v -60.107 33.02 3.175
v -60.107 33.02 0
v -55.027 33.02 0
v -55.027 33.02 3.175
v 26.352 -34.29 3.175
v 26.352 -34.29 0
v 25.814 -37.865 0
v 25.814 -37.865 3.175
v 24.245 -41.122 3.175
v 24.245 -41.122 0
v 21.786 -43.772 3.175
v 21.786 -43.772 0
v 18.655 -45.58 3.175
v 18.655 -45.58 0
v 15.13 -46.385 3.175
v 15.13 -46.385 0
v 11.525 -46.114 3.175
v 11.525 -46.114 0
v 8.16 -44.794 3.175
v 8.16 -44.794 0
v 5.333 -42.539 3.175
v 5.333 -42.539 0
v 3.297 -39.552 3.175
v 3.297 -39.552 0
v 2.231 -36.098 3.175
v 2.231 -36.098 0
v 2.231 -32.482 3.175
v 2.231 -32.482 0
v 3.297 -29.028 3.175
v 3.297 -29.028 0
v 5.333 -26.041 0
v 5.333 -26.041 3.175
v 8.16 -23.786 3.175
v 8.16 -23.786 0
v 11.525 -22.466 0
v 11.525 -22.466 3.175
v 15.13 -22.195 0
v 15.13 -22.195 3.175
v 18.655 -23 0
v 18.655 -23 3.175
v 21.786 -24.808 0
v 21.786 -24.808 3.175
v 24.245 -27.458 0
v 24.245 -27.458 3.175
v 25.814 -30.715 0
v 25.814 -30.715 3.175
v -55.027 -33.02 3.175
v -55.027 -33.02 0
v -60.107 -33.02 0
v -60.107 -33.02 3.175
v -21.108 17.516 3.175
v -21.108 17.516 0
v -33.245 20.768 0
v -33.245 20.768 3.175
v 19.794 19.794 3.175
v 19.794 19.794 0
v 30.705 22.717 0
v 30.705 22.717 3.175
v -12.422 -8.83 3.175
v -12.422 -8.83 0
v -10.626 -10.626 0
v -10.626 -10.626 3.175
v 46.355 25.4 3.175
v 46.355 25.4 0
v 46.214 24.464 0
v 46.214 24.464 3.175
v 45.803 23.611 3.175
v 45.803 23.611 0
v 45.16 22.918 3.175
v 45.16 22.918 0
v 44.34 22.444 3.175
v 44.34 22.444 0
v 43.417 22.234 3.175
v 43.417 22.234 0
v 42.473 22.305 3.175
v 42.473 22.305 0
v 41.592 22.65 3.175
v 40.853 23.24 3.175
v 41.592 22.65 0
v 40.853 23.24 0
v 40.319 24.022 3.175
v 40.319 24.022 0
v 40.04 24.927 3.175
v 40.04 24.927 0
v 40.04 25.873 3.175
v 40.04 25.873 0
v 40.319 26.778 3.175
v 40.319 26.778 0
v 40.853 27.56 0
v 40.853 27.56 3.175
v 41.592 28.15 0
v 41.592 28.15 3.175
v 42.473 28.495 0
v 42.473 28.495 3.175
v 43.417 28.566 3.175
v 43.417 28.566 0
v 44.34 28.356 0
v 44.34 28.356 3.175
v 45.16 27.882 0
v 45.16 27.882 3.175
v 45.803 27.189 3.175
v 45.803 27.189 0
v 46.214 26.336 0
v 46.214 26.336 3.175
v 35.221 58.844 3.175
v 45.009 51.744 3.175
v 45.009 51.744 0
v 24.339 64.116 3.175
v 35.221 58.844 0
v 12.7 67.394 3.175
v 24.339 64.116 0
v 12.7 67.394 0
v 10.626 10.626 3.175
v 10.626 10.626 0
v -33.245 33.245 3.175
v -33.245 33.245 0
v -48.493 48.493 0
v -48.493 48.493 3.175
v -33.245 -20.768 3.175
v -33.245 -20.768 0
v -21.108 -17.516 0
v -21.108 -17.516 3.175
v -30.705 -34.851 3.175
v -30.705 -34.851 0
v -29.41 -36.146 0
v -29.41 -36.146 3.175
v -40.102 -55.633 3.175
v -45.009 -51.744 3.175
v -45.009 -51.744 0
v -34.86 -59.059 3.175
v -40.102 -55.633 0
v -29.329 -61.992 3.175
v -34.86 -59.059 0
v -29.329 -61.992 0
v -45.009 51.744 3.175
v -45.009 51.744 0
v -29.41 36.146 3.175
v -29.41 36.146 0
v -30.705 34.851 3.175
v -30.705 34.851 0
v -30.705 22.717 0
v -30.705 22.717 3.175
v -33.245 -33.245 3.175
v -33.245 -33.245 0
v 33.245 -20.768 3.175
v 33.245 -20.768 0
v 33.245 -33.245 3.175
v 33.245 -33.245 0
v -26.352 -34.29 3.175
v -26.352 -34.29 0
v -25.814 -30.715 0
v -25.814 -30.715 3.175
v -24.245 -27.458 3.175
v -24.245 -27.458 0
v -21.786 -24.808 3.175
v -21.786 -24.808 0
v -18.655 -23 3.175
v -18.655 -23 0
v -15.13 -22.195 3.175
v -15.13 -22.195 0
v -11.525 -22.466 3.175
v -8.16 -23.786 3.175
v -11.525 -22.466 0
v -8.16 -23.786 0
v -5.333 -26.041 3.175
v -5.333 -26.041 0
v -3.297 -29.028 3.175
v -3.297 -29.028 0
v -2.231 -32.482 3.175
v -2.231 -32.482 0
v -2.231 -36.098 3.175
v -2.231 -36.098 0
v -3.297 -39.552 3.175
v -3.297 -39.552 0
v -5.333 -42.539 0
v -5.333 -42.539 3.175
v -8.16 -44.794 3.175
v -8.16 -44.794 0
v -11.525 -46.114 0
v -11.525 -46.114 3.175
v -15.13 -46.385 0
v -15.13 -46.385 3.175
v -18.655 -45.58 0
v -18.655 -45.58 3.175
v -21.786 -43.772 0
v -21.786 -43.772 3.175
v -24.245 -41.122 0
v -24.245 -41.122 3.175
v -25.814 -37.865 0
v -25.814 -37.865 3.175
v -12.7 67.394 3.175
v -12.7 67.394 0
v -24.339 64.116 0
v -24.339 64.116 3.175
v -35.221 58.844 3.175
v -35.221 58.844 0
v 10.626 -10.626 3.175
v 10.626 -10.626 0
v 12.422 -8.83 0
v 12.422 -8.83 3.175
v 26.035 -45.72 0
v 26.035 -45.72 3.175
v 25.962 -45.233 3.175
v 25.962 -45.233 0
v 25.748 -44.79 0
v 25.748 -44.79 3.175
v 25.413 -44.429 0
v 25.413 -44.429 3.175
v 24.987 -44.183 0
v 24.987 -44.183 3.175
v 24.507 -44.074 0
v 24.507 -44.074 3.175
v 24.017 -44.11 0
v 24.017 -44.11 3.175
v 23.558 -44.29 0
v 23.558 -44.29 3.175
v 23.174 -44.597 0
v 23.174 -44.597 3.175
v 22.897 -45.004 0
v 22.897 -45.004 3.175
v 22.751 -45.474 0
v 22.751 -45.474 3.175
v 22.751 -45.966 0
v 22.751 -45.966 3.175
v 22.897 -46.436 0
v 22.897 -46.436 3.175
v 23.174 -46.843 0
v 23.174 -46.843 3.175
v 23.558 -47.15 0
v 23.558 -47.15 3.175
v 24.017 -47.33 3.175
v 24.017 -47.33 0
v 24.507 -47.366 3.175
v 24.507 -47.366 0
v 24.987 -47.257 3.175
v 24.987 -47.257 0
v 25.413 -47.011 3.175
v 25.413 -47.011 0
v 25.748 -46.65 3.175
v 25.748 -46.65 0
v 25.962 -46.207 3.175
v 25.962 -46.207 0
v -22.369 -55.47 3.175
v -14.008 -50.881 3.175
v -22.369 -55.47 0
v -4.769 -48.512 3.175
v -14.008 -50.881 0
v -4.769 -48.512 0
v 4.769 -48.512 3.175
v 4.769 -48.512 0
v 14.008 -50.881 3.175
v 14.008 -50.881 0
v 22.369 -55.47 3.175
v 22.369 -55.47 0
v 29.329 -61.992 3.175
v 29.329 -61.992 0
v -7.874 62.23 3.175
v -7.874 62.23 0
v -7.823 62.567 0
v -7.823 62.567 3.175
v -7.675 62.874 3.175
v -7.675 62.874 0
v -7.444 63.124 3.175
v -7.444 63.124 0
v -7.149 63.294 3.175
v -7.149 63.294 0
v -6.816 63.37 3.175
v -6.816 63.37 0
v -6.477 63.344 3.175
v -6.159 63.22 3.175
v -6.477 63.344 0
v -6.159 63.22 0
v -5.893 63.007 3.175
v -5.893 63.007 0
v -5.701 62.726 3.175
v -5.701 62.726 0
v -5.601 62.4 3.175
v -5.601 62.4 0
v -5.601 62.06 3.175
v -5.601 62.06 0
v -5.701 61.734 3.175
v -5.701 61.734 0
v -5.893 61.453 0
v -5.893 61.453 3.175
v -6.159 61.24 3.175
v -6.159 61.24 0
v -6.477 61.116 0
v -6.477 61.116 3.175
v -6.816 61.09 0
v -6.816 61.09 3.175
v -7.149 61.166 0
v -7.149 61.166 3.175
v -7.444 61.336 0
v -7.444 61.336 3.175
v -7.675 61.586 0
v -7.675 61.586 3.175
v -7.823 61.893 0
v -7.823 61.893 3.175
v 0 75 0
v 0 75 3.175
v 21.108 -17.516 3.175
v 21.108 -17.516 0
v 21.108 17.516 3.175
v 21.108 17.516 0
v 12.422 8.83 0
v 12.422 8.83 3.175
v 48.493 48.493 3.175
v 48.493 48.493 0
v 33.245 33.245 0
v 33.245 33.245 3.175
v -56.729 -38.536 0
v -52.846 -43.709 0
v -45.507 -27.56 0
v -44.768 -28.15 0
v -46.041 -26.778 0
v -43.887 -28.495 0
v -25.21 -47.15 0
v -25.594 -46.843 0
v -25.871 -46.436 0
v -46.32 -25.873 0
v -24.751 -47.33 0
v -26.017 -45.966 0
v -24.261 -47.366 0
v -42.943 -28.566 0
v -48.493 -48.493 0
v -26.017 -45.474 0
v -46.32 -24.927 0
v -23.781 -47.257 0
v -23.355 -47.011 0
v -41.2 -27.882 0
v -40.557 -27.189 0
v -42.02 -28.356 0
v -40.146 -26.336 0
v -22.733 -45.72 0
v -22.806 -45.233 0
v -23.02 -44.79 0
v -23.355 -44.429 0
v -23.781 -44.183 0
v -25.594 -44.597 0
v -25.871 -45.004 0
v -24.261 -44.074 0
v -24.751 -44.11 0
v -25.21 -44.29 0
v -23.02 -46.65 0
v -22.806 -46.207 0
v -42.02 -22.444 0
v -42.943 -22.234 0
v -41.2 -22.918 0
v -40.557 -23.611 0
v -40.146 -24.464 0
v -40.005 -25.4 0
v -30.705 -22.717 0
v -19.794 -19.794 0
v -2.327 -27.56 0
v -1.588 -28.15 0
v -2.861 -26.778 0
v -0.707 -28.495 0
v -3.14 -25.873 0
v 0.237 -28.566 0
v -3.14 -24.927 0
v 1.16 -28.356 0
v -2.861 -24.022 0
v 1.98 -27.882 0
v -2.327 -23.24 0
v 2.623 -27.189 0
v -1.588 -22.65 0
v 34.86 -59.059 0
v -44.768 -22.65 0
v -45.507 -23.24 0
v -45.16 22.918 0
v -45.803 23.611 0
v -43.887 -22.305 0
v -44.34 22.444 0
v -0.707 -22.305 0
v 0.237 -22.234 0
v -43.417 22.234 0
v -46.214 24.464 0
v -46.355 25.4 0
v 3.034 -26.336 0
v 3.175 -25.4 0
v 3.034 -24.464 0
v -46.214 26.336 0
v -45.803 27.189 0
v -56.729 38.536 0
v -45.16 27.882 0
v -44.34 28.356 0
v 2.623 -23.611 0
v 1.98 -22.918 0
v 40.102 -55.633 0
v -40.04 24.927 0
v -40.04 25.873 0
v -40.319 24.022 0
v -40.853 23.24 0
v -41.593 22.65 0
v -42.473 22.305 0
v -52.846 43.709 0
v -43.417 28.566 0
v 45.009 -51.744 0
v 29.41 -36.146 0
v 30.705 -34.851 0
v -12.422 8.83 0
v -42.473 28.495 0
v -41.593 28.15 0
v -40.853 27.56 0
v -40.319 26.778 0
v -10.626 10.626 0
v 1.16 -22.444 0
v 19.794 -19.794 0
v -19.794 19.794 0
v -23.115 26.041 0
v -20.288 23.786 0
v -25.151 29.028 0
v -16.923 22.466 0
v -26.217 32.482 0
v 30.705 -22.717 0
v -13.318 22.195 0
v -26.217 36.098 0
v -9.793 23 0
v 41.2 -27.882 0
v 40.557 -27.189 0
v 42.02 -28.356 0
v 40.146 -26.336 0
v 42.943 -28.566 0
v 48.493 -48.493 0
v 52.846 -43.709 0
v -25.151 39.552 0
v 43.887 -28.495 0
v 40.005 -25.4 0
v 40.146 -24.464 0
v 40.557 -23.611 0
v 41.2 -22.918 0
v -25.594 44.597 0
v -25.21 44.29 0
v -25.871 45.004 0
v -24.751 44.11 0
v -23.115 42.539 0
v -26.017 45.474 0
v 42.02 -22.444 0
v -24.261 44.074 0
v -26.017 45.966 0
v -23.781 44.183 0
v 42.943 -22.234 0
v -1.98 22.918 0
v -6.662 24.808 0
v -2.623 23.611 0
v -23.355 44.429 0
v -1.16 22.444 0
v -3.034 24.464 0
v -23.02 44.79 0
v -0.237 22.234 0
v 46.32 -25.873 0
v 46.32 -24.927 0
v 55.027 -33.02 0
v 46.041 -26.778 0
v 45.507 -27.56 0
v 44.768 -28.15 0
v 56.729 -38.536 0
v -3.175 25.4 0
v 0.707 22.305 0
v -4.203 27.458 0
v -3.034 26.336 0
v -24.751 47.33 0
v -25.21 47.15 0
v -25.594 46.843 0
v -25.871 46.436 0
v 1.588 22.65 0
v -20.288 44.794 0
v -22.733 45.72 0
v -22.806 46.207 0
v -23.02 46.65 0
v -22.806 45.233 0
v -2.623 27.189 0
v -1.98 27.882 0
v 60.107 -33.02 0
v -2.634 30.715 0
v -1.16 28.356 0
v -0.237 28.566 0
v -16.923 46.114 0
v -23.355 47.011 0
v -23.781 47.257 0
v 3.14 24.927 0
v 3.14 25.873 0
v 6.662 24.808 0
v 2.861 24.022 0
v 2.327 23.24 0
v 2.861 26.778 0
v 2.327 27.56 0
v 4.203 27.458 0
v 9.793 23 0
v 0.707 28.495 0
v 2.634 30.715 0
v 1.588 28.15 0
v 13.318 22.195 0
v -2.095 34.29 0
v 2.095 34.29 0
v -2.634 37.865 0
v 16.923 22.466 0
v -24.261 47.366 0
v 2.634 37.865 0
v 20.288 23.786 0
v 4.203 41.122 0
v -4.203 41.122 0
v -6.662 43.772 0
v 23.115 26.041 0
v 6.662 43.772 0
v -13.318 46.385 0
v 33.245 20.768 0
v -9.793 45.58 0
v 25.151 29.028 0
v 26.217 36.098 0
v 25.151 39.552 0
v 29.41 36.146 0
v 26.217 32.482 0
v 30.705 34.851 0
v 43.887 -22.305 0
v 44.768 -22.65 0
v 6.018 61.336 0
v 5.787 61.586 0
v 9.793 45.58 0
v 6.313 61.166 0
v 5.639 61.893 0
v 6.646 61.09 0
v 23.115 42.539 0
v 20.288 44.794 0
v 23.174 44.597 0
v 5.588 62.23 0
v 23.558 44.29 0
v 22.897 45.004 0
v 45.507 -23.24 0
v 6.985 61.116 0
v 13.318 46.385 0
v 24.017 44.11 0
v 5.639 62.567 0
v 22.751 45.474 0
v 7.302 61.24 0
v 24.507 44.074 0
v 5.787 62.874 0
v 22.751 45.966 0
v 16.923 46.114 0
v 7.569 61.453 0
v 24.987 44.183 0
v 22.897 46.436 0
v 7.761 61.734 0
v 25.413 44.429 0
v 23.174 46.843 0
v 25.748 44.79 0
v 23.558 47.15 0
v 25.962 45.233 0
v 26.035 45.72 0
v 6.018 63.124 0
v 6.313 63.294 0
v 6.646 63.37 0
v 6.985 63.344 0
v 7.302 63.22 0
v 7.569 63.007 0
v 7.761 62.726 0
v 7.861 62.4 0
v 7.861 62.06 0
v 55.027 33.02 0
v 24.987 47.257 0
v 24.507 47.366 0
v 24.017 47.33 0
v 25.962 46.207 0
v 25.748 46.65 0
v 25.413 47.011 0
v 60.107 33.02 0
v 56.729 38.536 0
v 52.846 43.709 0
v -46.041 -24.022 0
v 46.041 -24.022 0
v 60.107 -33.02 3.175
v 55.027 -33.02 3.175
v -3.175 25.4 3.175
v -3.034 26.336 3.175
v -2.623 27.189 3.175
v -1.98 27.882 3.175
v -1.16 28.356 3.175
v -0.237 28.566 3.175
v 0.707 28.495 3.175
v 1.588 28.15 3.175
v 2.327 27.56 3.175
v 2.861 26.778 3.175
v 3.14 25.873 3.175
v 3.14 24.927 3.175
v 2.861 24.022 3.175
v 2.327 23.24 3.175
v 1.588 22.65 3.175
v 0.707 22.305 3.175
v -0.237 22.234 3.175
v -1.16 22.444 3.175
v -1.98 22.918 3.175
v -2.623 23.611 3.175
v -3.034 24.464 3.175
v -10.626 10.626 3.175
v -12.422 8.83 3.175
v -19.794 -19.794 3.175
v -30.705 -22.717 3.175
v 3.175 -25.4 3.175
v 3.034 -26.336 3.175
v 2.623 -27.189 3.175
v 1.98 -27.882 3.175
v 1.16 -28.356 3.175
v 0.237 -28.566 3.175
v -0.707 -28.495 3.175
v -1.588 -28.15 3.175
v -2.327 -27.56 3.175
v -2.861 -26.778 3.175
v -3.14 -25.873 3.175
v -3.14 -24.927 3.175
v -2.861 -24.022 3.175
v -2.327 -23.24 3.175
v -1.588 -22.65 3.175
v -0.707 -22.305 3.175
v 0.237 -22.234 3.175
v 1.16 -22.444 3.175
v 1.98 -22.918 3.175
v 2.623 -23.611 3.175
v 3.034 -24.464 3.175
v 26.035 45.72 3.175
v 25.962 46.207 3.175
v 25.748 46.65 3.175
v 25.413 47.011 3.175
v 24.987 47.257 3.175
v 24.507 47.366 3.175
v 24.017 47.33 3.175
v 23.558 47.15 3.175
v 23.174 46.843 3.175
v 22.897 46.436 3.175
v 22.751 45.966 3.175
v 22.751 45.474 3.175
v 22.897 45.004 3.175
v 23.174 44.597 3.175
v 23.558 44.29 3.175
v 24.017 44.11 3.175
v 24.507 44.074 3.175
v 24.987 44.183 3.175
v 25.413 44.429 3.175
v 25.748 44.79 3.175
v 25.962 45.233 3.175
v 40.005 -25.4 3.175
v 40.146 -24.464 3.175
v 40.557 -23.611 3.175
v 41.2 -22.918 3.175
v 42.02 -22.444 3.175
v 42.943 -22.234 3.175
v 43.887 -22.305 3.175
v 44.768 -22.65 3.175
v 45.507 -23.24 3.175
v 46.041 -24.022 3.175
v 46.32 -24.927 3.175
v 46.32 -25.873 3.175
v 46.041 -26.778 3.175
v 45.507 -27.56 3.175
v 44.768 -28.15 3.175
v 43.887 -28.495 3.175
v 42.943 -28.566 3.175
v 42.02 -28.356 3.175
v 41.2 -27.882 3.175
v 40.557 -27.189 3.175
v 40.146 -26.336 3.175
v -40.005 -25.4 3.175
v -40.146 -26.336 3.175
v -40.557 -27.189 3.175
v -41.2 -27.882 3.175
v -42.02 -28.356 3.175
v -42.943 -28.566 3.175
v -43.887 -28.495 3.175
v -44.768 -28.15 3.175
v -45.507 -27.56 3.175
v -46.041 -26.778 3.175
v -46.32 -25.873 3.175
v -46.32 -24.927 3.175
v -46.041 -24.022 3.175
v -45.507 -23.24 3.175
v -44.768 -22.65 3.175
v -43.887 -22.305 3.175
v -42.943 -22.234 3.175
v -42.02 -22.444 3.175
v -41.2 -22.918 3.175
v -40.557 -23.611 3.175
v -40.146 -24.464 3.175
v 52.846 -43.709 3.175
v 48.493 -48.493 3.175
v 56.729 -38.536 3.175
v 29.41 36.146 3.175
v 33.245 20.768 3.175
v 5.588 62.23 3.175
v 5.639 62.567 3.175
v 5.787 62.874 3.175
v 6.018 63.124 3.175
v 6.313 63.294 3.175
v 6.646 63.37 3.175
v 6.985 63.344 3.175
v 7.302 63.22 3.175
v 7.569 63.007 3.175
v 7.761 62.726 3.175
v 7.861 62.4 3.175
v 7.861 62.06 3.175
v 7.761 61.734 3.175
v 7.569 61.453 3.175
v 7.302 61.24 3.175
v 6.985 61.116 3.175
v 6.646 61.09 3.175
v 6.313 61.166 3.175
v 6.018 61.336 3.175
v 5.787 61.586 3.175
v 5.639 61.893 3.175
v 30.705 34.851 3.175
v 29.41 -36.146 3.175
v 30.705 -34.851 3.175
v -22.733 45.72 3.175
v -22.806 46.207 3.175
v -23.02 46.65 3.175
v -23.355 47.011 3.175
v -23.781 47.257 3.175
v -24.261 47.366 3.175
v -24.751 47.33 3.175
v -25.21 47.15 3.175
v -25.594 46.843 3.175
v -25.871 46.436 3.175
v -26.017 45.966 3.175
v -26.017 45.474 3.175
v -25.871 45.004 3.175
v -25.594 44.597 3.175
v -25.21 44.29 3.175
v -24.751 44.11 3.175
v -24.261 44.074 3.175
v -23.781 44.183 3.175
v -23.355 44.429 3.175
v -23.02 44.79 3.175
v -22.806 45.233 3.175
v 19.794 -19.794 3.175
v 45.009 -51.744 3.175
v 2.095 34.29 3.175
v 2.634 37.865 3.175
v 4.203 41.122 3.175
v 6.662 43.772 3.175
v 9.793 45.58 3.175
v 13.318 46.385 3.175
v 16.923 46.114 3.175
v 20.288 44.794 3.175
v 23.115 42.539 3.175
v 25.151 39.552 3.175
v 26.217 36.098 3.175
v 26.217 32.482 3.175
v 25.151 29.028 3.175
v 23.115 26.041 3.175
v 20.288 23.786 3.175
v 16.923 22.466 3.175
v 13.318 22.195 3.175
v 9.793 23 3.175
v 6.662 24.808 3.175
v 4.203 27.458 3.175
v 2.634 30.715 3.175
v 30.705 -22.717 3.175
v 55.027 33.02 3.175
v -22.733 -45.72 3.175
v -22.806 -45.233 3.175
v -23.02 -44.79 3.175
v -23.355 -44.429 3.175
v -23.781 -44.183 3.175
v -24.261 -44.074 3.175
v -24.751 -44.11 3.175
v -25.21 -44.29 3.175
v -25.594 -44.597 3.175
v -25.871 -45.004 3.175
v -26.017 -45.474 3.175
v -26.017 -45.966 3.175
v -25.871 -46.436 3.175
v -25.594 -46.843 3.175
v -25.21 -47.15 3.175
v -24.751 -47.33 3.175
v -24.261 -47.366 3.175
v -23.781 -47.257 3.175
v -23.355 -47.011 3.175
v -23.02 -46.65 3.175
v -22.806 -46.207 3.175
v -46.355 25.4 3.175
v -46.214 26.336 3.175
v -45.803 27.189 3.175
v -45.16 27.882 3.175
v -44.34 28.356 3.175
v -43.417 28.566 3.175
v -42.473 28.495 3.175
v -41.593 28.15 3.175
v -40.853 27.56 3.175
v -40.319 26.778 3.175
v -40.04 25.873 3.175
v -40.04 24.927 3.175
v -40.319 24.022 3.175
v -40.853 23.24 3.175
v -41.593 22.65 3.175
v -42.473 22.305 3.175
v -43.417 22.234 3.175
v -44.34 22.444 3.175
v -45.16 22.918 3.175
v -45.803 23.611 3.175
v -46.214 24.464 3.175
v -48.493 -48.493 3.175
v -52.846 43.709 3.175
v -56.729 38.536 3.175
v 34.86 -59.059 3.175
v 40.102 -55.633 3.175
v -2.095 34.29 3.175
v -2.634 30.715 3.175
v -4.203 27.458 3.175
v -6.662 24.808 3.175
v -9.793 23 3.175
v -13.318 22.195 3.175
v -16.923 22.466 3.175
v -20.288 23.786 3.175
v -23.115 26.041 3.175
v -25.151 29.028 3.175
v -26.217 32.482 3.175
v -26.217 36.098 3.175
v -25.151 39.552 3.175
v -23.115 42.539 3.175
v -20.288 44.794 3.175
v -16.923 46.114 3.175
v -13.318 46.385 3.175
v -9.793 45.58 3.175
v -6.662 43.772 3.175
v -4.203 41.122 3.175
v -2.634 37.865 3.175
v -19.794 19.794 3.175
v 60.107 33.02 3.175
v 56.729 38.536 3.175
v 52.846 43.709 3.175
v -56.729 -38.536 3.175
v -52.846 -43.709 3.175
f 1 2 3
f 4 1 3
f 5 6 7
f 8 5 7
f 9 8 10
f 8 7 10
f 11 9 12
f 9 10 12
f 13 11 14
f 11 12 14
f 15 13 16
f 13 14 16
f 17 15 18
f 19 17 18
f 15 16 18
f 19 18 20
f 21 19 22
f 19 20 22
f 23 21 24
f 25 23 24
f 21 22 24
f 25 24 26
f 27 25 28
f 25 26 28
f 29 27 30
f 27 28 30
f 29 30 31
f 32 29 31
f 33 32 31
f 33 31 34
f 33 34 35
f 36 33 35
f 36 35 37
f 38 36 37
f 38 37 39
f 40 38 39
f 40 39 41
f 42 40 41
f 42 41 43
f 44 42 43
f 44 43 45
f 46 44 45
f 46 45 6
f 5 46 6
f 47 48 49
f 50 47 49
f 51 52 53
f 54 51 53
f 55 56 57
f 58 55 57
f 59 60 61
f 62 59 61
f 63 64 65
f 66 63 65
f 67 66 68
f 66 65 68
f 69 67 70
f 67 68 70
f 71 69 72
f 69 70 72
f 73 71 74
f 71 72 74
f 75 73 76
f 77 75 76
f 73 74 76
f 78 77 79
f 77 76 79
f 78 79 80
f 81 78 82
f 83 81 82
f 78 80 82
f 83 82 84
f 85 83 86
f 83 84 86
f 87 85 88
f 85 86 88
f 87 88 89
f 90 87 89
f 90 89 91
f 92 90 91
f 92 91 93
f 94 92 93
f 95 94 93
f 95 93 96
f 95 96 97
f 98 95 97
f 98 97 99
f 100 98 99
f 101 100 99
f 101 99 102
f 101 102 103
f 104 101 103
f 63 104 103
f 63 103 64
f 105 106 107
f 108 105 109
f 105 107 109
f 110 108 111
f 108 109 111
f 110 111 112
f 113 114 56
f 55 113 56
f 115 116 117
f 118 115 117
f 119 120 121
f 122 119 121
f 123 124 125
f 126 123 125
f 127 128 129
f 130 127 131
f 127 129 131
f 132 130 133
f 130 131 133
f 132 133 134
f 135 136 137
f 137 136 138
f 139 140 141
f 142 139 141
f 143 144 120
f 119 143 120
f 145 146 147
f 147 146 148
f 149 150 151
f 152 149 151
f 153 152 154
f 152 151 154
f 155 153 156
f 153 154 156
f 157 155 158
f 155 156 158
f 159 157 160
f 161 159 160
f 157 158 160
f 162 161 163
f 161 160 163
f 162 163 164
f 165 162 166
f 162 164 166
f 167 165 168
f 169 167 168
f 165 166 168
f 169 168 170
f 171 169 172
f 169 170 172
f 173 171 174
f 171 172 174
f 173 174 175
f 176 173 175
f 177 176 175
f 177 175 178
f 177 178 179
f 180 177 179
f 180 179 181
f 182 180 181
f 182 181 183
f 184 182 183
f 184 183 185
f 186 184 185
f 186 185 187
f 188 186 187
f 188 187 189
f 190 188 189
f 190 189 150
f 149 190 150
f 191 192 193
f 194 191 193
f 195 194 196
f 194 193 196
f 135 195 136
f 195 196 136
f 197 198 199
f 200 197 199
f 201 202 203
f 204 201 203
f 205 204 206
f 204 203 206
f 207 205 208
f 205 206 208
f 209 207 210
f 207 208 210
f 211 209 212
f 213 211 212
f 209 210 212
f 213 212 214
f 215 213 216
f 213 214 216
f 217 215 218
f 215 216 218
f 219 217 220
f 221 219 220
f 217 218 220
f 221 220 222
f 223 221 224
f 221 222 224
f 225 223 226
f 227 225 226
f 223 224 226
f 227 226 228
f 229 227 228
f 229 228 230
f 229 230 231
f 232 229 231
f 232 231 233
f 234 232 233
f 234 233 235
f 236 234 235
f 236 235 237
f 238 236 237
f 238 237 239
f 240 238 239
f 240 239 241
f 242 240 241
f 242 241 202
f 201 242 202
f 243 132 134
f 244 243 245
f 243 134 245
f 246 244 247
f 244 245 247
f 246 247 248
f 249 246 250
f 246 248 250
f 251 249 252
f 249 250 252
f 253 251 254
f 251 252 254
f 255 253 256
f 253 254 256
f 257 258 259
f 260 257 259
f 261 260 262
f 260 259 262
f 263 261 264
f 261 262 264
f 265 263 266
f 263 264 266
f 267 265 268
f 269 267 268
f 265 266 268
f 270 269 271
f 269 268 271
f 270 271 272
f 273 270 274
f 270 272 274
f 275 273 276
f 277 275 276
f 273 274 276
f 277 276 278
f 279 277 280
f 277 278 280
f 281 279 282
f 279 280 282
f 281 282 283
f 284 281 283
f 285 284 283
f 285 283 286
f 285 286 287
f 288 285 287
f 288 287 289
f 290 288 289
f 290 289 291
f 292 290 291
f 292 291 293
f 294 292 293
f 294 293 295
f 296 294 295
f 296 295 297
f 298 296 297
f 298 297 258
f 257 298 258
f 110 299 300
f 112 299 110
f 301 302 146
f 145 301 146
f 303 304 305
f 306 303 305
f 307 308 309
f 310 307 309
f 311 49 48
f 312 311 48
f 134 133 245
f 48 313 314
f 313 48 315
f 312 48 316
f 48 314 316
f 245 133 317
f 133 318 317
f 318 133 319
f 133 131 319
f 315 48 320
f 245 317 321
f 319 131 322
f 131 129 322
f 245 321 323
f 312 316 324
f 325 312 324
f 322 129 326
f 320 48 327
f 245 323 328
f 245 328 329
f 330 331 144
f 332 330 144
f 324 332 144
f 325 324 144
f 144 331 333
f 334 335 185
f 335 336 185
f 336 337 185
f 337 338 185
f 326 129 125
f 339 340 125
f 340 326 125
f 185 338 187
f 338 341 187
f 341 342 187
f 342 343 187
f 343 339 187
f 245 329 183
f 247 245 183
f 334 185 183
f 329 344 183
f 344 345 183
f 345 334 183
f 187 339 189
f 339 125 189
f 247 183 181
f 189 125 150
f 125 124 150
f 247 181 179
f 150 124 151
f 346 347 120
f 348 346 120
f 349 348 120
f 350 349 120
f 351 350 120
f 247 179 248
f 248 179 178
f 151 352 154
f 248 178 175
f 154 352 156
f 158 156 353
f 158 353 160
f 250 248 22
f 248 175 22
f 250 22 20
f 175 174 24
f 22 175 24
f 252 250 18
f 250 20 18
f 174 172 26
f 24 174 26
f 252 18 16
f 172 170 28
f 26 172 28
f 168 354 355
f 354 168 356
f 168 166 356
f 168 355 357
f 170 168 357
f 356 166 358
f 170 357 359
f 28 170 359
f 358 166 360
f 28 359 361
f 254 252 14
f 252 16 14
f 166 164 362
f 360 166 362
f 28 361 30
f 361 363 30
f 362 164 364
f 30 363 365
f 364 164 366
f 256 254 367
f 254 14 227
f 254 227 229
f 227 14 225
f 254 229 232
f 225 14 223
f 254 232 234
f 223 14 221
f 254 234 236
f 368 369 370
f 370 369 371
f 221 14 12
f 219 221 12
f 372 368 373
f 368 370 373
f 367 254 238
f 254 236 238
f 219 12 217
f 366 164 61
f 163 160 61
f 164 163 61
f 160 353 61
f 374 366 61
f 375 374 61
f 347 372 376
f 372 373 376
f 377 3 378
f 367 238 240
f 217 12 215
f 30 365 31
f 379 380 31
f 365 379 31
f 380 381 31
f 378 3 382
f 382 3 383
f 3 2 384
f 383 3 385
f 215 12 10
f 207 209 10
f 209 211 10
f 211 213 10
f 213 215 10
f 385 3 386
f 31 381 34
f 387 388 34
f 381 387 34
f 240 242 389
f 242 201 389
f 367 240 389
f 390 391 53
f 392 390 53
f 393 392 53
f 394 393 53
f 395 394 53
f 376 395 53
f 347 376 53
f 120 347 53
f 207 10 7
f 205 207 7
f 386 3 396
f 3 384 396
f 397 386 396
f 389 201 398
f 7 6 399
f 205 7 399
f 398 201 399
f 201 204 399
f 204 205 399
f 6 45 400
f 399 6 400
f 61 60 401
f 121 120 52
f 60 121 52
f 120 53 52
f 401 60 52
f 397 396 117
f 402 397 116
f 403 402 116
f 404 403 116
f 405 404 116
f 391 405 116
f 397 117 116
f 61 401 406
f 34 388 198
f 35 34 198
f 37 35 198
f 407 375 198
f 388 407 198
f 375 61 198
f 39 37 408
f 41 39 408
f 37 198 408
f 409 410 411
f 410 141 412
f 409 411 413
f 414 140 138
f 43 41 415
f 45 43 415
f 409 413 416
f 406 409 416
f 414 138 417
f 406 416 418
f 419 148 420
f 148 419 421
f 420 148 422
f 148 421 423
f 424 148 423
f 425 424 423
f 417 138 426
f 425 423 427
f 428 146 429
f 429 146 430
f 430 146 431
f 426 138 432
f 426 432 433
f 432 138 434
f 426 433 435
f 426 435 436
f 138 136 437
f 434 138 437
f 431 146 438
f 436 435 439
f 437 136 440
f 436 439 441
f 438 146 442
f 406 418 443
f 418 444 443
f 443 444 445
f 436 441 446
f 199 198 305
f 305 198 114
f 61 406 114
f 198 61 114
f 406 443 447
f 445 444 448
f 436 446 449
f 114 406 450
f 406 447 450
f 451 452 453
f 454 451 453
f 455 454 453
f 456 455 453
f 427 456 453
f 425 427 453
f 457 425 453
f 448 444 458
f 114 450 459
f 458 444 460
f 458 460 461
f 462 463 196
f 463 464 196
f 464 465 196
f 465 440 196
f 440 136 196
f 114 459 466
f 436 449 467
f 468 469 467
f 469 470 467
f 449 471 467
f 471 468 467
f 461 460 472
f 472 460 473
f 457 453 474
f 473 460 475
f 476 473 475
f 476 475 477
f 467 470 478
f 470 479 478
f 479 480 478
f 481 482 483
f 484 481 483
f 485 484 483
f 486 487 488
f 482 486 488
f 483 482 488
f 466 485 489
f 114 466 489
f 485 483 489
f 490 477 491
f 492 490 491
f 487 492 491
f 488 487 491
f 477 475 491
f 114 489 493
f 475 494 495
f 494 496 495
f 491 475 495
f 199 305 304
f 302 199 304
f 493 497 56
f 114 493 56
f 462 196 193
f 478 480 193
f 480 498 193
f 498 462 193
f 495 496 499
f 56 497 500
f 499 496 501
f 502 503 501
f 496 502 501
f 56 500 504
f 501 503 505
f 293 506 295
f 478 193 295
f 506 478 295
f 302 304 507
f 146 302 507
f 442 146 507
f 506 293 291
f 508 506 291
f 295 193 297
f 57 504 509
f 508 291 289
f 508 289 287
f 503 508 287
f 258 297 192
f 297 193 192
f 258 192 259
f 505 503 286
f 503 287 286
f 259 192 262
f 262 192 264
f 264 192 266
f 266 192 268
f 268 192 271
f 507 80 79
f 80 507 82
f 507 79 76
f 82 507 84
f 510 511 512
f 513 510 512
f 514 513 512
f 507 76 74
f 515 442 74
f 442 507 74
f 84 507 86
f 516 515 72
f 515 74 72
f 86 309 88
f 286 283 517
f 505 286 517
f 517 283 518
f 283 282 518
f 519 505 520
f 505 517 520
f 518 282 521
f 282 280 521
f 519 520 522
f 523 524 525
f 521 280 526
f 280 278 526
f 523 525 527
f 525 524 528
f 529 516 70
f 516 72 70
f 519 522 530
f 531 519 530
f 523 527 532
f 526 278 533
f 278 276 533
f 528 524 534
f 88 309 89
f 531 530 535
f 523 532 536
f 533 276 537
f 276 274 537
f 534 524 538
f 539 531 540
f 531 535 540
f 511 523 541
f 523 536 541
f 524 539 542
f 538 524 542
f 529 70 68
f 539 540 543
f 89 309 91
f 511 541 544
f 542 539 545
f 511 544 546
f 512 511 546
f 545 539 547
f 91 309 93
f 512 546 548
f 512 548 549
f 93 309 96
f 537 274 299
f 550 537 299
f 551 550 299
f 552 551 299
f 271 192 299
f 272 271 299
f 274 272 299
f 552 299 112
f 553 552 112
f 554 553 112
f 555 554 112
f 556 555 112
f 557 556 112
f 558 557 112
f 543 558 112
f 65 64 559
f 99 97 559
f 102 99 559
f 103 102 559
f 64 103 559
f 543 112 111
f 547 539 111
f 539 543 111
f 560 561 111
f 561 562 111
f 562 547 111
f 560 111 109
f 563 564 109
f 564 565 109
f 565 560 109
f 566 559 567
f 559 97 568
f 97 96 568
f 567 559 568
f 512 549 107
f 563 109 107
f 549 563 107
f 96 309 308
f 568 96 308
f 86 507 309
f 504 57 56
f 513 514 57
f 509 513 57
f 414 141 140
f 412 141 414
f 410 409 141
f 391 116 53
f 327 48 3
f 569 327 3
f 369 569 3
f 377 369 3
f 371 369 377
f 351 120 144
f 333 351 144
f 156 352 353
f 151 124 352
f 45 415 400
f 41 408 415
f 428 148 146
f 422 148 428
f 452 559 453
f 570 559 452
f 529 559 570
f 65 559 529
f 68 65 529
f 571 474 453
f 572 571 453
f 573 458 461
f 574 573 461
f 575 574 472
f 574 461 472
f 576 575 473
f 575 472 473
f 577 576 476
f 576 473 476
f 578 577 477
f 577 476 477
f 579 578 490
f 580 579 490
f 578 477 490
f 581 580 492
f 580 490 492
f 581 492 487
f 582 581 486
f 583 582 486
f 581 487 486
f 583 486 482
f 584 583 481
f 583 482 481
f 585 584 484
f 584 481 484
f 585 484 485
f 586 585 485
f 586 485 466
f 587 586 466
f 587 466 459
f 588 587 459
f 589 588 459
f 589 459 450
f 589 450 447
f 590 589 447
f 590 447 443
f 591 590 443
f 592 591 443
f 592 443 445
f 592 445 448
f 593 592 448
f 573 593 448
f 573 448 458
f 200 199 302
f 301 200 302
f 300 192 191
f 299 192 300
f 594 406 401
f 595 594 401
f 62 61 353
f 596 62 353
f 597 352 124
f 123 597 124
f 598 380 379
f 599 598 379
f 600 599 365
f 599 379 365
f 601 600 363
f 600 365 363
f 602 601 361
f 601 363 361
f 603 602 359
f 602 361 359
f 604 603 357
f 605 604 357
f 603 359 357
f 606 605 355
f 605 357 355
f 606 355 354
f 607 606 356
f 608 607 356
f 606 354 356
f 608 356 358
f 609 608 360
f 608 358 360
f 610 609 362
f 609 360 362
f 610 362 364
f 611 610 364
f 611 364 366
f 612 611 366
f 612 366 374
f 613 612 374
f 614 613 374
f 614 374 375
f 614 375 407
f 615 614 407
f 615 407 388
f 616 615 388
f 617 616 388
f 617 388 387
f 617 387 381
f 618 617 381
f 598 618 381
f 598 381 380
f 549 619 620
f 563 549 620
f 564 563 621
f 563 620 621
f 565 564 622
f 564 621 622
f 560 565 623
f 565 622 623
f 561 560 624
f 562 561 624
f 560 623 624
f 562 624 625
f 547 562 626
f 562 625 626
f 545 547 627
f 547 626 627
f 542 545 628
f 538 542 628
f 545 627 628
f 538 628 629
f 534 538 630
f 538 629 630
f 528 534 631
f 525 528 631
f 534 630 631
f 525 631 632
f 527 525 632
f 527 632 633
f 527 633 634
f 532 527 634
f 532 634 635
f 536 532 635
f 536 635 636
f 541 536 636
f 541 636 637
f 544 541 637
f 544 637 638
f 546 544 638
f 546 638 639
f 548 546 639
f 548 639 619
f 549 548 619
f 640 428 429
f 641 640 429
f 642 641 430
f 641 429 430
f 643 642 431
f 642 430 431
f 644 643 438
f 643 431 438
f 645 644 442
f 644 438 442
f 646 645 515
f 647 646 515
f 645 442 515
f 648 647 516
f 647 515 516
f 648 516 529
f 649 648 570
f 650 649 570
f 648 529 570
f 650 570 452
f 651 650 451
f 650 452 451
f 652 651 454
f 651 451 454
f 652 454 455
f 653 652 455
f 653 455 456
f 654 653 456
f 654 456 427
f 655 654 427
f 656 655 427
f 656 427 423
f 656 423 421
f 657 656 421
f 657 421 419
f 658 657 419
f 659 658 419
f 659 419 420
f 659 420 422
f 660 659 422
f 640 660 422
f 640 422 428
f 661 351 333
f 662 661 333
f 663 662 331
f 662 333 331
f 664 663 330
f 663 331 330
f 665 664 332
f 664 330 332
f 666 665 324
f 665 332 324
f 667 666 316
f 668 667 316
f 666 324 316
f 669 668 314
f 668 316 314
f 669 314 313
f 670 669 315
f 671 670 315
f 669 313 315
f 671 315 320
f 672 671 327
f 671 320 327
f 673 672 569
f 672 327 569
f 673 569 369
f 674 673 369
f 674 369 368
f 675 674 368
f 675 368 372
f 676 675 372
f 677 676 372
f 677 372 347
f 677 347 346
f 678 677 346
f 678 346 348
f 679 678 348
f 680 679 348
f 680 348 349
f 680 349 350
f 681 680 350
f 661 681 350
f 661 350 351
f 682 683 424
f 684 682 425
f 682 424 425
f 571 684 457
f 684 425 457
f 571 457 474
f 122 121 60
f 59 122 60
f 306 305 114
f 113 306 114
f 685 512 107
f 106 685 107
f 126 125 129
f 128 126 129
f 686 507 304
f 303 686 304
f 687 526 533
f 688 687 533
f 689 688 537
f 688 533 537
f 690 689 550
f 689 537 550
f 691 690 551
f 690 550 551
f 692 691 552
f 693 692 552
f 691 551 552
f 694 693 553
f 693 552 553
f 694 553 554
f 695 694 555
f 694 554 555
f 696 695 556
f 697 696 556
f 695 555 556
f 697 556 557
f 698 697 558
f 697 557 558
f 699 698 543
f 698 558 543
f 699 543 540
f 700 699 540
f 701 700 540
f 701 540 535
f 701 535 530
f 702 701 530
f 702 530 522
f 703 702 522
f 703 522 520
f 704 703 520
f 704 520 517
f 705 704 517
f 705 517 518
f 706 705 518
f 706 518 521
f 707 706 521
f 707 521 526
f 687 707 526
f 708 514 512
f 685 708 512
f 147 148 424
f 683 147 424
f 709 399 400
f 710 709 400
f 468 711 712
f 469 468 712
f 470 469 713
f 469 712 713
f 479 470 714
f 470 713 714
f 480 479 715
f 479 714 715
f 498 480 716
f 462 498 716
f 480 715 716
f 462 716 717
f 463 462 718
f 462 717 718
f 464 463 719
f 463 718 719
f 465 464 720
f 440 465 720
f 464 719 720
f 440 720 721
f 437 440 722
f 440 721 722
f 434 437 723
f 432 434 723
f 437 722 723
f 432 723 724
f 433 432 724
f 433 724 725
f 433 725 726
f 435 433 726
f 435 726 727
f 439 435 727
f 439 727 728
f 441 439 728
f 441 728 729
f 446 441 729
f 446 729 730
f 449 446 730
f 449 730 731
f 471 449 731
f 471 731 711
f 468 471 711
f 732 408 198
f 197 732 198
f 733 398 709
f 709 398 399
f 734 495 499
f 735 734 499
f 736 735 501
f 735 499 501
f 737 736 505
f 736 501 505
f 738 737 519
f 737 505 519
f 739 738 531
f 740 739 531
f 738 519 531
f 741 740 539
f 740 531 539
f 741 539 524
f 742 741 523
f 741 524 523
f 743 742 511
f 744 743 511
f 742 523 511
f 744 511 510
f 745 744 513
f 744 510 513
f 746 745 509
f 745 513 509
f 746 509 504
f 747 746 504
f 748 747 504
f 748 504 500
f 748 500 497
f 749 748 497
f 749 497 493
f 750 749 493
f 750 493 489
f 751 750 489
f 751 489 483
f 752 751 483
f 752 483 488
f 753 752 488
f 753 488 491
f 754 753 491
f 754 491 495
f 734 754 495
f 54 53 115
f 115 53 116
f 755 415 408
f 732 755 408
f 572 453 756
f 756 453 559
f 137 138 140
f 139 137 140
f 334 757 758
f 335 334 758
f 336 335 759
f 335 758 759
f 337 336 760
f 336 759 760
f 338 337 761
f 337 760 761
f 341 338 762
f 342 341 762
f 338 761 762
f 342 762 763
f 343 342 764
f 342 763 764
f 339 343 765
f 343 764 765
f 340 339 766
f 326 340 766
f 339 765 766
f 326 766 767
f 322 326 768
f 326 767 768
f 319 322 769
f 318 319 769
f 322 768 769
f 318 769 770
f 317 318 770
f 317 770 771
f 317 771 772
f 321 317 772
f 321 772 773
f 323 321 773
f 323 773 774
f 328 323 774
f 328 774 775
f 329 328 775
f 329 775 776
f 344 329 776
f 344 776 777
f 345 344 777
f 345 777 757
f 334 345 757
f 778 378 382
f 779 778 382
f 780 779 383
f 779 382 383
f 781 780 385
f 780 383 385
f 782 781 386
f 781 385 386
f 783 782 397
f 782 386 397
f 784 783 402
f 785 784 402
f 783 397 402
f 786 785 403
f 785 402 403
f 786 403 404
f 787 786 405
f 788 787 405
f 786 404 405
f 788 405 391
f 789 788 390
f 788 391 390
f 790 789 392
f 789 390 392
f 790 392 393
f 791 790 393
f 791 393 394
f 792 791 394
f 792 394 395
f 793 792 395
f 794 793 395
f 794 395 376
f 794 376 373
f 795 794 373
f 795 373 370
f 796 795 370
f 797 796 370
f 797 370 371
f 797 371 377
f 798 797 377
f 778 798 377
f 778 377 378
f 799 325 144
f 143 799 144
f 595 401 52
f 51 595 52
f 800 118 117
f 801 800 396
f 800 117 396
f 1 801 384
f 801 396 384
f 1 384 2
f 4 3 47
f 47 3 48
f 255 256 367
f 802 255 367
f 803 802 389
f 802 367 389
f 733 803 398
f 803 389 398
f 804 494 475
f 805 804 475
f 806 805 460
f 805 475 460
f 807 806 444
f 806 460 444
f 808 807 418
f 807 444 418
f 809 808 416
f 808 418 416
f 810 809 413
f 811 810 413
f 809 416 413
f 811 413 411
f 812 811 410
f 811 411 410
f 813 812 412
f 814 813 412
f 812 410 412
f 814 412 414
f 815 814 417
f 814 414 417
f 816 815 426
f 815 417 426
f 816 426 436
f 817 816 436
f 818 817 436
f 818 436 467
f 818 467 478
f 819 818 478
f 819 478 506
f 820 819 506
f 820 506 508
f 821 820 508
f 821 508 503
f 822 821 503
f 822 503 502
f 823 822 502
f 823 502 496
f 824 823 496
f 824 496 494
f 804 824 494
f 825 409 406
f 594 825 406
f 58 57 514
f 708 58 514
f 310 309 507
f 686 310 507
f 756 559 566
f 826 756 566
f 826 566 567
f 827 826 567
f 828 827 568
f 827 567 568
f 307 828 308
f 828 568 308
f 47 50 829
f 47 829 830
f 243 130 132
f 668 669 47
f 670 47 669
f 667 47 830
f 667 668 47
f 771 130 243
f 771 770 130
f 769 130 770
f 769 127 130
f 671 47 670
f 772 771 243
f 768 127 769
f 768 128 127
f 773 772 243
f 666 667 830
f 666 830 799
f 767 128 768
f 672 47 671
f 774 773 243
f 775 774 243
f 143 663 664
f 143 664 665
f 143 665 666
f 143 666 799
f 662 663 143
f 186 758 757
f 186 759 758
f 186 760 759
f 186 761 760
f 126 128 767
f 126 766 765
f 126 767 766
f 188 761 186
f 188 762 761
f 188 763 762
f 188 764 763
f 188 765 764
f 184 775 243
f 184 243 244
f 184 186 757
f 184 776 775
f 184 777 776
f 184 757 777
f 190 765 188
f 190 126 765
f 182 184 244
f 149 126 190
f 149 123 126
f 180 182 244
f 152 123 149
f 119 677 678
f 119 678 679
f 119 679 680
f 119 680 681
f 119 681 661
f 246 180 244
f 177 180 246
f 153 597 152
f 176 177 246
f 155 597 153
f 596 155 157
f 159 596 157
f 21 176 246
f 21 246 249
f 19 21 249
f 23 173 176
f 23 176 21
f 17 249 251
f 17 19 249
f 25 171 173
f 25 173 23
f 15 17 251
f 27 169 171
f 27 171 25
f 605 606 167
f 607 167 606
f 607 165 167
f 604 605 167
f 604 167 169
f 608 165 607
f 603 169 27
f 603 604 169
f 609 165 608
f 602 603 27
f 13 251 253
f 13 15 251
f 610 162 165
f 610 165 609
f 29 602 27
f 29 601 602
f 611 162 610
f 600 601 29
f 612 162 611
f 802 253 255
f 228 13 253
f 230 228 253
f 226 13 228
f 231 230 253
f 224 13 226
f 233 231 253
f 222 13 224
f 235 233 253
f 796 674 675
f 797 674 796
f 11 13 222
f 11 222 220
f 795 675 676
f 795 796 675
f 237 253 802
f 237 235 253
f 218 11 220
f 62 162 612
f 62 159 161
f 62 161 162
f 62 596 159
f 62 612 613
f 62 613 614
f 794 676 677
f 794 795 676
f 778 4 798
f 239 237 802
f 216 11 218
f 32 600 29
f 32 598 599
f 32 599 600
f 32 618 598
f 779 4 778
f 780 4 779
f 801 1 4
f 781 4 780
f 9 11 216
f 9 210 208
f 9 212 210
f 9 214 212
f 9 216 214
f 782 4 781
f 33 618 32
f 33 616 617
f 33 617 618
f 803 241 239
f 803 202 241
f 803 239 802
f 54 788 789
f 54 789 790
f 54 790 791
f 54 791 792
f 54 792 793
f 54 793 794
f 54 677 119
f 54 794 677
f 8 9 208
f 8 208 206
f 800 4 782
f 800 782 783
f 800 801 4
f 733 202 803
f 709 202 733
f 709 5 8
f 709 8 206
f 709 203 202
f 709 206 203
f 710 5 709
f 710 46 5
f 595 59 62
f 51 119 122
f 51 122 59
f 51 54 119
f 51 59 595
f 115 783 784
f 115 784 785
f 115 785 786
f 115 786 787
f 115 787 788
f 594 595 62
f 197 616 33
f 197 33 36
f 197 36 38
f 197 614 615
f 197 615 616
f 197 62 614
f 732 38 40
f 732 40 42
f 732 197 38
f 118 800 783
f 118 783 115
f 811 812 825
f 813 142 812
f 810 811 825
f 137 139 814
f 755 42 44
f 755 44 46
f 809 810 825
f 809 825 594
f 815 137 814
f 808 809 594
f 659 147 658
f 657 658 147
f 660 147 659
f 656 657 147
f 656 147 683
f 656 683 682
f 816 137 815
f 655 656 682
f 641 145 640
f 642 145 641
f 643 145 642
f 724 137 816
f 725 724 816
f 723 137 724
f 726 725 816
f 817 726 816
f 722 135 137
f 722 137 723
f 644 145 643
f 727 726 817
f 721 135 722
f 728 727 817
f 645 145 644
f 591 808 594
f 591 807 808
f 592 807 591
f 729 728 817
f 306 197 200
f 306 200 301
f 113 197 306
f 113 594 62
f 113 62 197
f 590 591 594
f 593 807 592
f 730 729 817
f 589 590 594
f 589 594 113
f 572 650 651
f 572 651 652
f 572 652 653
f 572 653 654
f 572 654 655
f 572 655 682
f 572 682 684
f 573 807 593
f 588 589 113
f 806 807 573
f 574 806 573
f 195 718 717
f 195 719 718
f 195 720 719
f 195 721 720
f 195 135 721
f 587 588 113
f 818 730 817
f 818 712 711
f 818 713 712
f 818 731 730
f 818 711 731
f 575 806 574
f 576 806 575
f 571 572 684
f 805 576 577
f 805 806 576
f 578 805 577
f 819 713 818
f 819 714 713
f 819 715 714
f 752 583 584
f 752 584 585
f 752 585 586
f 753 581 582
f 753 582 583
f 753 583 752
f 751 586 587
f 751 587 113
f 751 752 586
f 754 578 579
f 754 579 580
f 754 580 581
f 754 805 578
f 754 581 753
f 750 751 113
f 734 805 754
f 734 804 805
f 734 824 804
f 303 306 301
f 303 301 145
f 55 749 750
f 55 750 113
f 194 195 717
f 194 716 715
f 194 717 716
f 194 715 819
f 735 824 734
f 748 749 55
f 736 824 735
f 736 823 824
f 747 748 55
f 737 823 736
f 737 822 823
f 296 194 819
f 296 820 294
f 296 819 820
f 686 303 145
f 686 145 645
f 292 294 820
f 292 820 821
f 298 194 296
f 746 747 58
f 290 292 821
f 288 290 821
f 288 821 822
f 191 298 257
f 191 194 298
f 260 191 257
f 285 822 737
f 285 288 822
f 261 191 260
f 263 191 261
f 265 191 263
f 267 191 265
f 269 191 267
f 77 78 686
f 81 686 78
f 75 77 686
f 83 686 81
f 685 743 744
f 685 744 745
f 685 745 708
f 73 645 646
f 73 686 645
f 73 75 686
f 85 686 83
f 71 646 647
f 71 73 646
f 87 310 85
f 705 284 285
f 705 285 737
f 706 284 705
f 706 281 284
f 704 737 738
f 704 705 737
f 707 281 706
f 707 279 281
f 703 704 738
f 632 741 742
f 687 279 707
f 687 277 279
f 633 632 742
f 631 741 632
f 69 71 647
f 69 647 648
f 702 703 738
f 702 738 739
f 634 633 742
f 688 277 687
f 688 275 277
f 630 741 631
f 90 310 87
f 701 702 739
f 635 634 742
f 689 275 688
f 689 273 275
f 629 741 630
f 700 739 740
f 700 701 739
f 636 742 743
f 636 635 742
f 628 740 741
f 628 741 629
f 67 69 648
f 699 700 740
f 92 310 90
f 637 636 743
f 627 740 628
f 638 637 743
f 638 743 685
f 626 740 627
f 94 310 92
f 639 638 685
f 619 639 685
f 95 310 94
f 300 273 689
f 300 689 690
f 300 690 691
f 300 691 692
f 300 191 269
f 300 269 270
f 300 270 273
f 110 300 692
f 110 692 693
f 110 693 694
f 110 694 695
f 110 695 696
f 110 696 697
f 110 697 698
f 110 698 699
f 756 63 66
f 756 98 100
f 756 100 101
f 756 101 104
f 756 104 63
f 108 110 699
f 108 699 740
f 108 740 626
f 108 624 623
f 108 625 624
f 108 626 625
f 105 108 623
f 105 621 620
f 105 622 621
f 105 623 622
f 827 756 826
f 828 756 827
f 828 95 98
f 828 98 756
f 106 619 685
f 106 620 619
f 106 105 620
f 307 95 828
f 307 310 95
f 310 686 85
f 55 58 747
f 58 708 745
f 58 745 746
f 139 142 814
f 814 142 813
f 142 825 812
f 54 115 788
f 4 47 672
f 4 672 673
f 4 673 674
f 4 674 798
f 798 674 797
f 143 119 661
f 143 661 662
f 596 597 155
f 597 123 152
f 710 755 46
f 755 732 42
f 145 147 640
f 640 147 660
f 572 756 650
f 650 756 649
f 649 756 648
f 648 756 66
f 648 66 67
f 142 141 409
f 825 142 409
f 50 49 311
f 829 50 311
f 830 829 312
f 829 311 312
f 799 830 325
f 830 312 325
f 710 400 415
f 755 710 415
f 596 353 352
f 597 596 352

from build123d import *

# Parameters (mm, degrees)
BOSS_EXTRUDE2_DEPTH = 3.175
SKETCH3_R           = 12.1285
CUT_EXTRUDE2_DEPTH  = 92.247975457
SKETCH4_R           = 38.1
CUT_EXTRUDE3_DEPTH  = 92.247975457
CUT_EXTRUDE6_DEPTH  = 92.247975457
BOSS_EXTRUDE3_DEPTH = 3.175
SKETCH12_R          = 1.143
CUT_EXTRUDE9_DEPTH  = 97.166400707
SKETCH13_R          = 1.651
CUT_EXTRUDE10_DEPTH = 55.88
SKETCH14_R          = 3.175
CUT_EXTRUDE11_DEPTH = 129.184225337


with BuildPart() as part:
    # Sketch1 → Boss-Extrude2 (new body)
    with BuildSketch(Plane.XY):
        with BuildLine():
            Line((-60.107370596, 33.02), (-55.027370596, 33.02))
            Line((-55.027370596, 33.02), (-55.027370596, -33.02))
            Line((-55.027370596, -33.02), (-60.107370596, -33.02))
            ThreePointArc((-60.107370596, -33.02), (0, -68.58), (60.107370596, -33.02))
            Line((60.107370596, -33.02), (55.027370596, -33.02))
            Line((55.027370596, -33.02), (55.027370596, 33.02))
            Line((55.027370596, 33.02), (60.107370596, 33.02))
            ThreePointArc((60.107370596, 33.02), (0, 68.58), (-60.107370596, 33.02))
        make_face()
    extrude(amount=BOSS_EXTRUDE2_DEPTH)

    # Sketch3 → Cut-Extrude2 (cut, through all)
    with BuildSketch(Plane(origin=(0, 0, 0), x_dir=(-1, 0, 0), z_dir=(0, 0, -1))):
        with Locations((14.224, -34.29)):
            Circle(SKETCH3_R)
        with Locations(Location((14.224, 34.29, 0), (0, 0, 180))):
            Circle(SKETCH3_R)
        with Locations((-14.224, 34.29)):
            Circle(SKETCH3_R)
        with Locations(Location((-14.224, -34.29, 0), (0, 0, 180))):
            Circle(SKETCH3_R)
    extrude(amount=-CUT_EXTRUDE2_DEPTH, mode=Mode.SUBTRACT)

    # Sketch4 → Cut-Extrude3 (cut, through all)
    with BuildSketch(Plane(origin=(0, 0, 0), x_dir=(-1, 0, 0), z_dir=(0, 0, -1))):
        with Locations((0, -86.312058398)):
            Circle(SKETCH4_R)
    extrude(amount=-CUT_EXTRUDE3_DEPTH, mode=Mode.SUBTRACT)

    # Sketch5 → Cut-Extrude6 (cut, through all)
    with BuildSketch(Plane(origin=(0, 0, 0), x_dir=(-1, 0, 0), z_dir=(0, 0, -1))):
        with BuildLine():
            Line((10.776307345, -10.776307345), (19.793695097, -19.793695097))
            Line((19.793695097, -19.793695097), (30.704765274, -22.71730754))
            Line((30.704765274, -22.71730754), (30.704765274, -34.85110441))
            Line((30.704765274, -34.85110441), (29.410338797, -36.145530887))
            Line((29.410338797, -36.145530887), (45.008715274, -51.743907365))
            ThreePointArc((45.008715274, -51.743907365), (46.779291091, -50.148921474), (48.493383054, -48.493383054))
            Line((48.493383054, -48.493383054), (33.244765274, -33.244765274))
            Line((33.244765274, -33.244765274), (33.244765274, -20.76829699))
            Line((33.244765274, -20.76829699), (21.108495846, -17.516393398))
            Line((21.108495846, -17.516393398), (12.421633561, -8.829531113))
            Line((12.421633561, -8.829531113), (10.625582337, -10.625582337))
            Line((10.625582337, -10.625582337), (10.776307345, -10.776307345))
        make_face()
        with BuildLine():
            Line((-10.776307345, -10.776307345), (-10.625582337, -10.625582337))
            Line((-10.625582337, -10.625582337), (-12.421633561, -8.829531113))
            Line((-12.421633561, -8.829531113), (-21.108495846, -17.516393398))
            Line((-21.108495846, -17.516393398), (-33.244765274, -20.76829699))
            Line((-33.244765274, -20.76829699), (-33.244765274, -33.244765274))
            Line((-33.244765274, -33.244765274), (-48.493383054, -48.493383054))
            ThreePointArc((-48.493383054, -48.493383054), (-46.779291091, -50.148921474), (-45.008715274, -51.743907365))
            Line((-45.008715274, -51.743907365), (-29.410338797, -36.145530887))
            Line((-29.410338797, -36.145530887), (-30.704765274, -34.85110441))
            Line((-30.704765274, -34.85110441), (-30.704765274, -22.71730754))
            Line((-30.704765274, -22.71730754), (-19.793695097, -19.793695097))
            Line((-19.793695097, -19.793695097), (-10.776307345, -10.776307345))
        make_face()
        with BuildLine():
            Line((-10.776307345, 10.776307345), (-19.793695097, 19.793695097))
            Line((-19.793695097, 19.793695097), (-30.704765274, 22.71730754))
            Line((-30.704765274, 22.71730754), (-30.704765274, 34.85110441))
            Line((-30.704765274, 34.85110441), (-29.410338797, 36.145530887))
            Line((-29.410338797, 36.145530887), (-45.008715274, 51.743907365))
            ThreePointArc((-45.008715274, 51.743907365), (-46.779291091, 50.148921474), (-48.493383054, 48.493383054))
            Line((-48.493383054, 48.493383054), (-33.244765274, 33.244765274))
            Line((-33.244765274, 33.244765274), (-33.244765274, 20.76829699))
            Line((-33.244765274, 20.76829699), (-21.108495846, 17.516393398))
            Line((-21.108495846, 17.516393398), (-12.421633561, 8.829531113))
            Line((-12.421633561, 8.829531113), (-10.625582337, 10.625582337))
            Line((-10.625582337, 10.625582337), (-10.776307345, 10.776307345))
        make_face()
        with BuildLine():
            ThreePointArc((48.493383054, 48.493383054), (46.779291091, 50.148921474), (45.008715274, 51.743907365))
            Line((45.008715274, 51.743907365), (29.410338797, 36.145530887))
            Line((29.410338797, 36.145530887), (30.704765274, 34.85110441))
            Line((30.704765274, 34.85110441), (30.704765274, 22.71730754))
            Line((30.704765274, 22.71730754), (19.793695097, 19.793695097))
            Line((19.793695097, 19.793695097), (10.776307345, 10.776307345))
            Line((10.776307345, 10.776307345), (10.625582337, 10.625582337))
            Line((10.625582337, 10.625582337), (12.421633561, 8.829531113))
            Line((12.421633561, 8.829531113), (21.108495846, 17.516393398))
            Line((21.108495846, 17.516393398), (33.244765274, 20.76829699))
            Line((33.244765274, 20.76829699), (33.244765274, 33.244765274))
            Line((33.244765274, 33.244765274), (48.493383054, 48.493383054))
        make_face()
    extrude(amount=-CUT_EXTRUDE6_DEPTH, mode=Mode.SUBTRACT)

    # Sketch9 → Boss-Extrude3 (add)
    with BuildSketch(Plane(origin=(0, 0, 0), x_dir=(-1, 0, 0), z_dir=(0, 0, -1))):
        with BuildLine():
            Line((12.7, 67.39381574), (0, 75))
            Line((0, 75), (-12.7, 67.39381574))
            ThreePointArc((-12.7, 67.39381574), (0, 68.58), (12.7, 67.39381574))
        make_face()
    extrude(amount=-BOSS_EXTRUDE3_DEPTH)

    # Sketch12 → Cut-Extrude9 (cut, through all)
    with BuildSketch(Plane(origin=(0, 0, 0), x_dir=(-1, 0, 0), z_dir=(0, 0, -1))):
        with Locations((6.731, 62.23)):
            Circle(SKETCH12_R)
        with Locations((-6.731, 62.23)):
            Circle(SKETCH12_R)
    extrude(amount=-CUT_EXTRUDE9_DEPTH, mode=Mode.SUBTRACT)

    # Sketch13 → Cut-Extrude10 (cut)
    with BuildSketch(Plane(origin=(30.092005081, 4.08352975, 15.875), x_dir=(1, 0, 0), z_dir=(0, 0, 1))):
        with Locations((-54.476005081, -49.80352975)):
            Circle(SKETCH13_R)
        with Locations((-54.476005081, 41.63647025)):
            Circle(SKETCH13_R)
        with Locations((-5.708005081, -49.80352975)):
            Circle(SKETCH13_R)
        with Locations((-5.708005081, 41.63647025)):
            Circle(SKETCH13_R)
    extrude(amount=-CUT_EXTRUDE10_DEPTH, mode=Mode.SUBTRACT)

    # Sketch14 → Cut-Extrude11 (cut, through all)
    with BuildSketch(Plane(origin=(30.092005081, 4.08352975, -53.975), x_dir=(-1, 0, 0), z_dir=(0, 0, -1))):
        with Locations(Location((-13.087994919, 21.31647025, 0), (0, 0, 180))):
            Circle(SKETCH14_R)
        with Locations((73.272005081, 21.31647025)):
            Circle(SKETCH14_R)
        with Locations((30.092005081, 21.31647025)):
            Circle(SKETCH14_R)
        with Locations(Location((73.272005081, -29.48352975, 0), (0, 0, 180))):
            Circle(SKETCH14_R)
        with Locations(Location((30.092005081, -29.48352975, 0), (0, 0, 180))):
            Circle(SKETCH14_R)
        with Locations((-13.087994919, -29.48352975)):
            Circle(SKETCH14_R)
    extrude(amount=-CUT_EXTRUDE11_DEPTH, mode=Mode.SUBTRACT)


solid = part.part
